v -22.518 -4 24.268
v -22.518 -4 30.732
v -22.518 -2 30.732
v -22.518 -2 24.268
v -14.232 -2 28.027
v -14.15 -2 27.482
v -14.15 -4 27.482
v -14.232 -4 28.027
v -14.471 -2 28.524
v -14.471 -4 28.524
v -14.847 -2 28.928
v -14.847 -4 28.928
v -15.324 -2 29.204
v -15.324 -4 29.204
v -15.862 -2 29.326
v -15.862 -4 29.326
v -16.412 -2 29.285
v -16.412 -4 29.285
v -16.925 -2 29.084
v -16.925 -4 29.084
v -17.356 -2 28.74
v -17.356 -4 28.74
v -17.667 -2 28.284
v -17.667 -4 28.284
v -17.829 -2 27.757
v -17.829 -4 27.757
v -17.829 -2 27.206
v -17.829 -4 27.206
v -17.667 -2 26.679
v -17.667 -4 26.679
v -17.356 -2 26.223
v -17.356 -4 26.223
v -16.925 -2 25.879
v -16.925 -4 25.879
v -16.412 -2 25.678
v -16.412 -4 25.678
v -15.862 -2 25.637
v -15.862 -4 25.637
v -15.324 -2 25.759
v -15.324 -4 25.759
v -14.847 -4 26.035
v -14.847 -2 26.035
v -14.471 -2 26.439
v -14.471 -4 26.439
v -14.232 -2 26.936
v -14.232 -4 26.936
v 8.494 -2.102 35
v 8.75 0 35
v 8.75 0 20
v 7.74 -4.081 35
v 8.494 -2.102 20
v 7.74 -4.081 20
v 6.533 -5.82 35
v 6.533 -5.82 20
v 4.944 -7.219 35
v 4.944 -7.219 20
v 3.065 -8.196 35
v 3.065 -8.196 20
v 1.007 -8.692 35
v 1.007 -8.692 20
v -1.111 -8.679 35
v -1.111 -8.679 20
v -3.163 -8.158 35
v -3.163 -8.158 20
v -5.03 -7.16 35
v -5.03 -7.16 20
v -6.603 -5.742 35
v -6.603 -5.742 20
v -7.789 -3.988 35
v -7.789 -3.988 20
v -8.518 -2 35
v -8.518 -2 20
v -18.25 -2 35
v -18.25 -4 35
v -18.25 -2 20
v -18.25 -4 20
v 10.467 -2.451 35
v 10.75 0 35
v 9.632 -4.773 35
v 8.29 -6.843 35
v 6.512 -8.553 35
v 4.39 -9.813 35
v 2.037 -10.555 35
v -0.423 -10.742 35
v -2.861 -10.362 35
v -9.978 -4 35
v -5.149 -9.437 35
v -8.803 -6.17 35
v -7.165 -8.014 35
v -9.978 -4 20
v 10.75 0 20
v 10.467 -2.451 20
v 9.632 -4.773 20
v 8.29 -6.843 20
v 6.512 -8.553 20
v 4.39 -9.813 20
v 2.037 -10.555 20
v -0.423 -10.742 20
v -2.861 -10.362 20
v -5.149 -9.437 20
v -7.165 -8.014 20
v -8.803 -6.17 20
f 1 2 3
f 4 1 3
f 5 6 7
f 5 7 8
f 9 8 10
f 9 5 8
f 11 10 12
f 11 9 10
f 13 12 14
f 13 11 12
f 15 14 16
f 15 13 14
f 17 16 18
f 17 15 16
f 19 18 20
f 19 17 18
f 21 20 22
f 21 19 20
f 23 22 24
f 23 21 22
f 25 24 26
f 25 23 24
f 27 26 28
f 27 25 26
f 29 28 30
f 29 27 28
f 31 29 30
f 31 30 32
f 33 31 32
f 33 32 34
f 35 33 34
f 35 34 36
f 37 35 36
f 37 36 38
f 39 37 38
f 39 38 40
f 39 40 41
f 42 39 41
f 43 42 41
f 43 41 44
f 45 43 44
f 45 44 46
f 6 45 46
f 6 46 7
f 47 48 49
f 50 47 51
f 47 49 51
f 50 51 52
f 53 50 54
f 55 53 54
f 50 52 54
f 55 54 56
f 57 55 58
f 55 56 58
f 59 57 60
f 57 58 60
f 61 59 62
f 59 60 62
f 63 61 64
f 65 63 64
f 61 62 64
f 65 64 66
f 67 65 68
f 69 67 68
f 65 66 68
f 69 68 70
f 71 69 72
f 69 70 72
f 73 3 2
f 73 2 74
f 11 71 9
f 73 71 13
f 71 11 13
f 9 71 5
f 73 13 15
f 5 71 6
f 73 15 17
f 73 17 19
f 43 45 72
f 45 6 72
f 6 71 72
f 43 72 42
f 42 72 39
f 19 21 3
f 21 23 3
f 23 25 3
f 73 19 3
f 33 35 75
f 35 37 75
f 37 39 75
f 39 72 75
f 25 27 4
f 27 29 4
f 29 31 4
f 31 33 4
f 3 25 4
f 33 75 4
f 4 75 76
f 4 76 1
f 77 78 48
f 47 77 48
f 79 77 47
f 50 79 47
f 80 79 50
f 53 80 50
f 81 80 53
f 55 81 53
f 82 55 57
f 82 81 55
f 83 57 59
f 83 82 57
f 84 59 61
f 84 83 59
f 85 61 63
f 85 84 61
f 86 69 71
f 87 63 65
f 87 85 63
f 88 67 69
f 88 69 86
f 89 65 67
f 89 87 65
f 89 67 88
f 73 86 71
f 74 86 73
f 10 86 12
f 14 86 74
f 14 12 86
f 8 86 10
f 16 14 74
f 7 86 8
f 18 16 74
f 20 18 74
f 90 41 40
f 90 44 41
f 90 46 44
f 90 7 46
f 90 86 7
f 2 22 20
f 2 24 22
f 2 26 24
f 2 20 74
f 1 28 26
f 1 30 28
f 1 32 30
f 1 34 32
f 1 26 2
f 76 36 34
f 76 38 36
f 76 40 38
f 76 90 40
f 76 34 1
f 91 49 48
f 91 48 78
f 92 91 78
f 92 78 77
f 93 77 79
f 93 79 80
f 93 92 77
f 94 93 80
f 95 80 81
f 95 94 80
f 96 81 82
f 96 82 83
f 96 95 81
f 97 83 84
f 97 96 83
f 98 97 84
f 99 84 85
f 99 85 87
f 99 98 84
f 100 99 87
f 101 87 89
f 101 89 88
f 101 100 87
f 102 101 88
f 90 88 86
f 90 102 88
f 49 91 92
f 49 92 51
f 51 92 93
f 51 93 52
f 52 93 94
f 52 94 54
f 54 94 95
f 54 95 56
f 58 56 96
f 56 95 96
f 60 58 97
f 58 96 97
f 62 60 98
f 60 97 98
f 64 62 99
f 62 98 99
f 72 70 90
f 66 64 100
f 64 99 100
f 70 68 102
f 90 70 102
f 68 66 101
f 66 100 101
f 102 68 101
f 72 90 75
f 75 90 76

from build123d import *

# Parameters (mm, degrees)
SKETCH016_R       = 1.85
EXTRUDE013_DEPTH  = 12
CYLINDER007_R     = 5
CYLINDER007_DEPTH = 1
EXTRUDE012_DEPTH  = 15


with BuildPart() as extrude013:
    # Sketch016 → Extrude013 (new body)
    with BuildSketch(Plane.XZ):
        Polygon((11.75, 36), (11.75, 19), (-17.25, 19), (-23.25, 25), (-23.25, 30), (-17.25, 36), align=None)
        with Locations((-16, 27.481564)):
            Circle(SKETCH016_R, mode=Mode.SUBTRACT)
    extrude(amount=-EXTRUDE013_DEPTH)


with BuildPart() as unprintable:
    # Cylinder007 → Cylinder007 (new body)
    with BuildSketch(Plane(origin=(-16, 18, 27.5), x_dir=(1, 0, 0), z_dir=(0, -1, 0))):
        Circle(CYLINDER007_R)
    extrude(amount=CYLINDER007_DEPTH)


with BuildPart() as body007:
    # Sketch015 → Extrude012 (new body)
    with BuildSketch(Plane.XY.offset(50)):
        with BuildLine():
            ThreePointArc((8.75, 0), (1.006685, 8.691898), (-8.518363, 2))
            Line((-8.518363, 2), (-22.518363, 2))
            Line((-22.518363, 4), (-22.518363, 2))
            Line((-9.978101, 4), (-22.518363, 4))
            ThreePointArc((10.75, 0), (2.036899, 10.555261), (-9.978101, 4))
            Line((8.75, 0), (10.75, 0))
        make_face()
    extrude(amount=EXTRUDE012_DEPTH)


with BuildPart() as body007_1:
    # Extrude012 placement: moved
    add(body007.part.moved(Location((0, 0, -30))))

    # Fusion016: union unprintable
    add(unprintable.part)

    # Common001: intersect Extrude013
    add(extrude013.part, mode=Mode.INTERSECT)


with BuildPart() as part_mirroring008:
    # Part__Mirroring008: instance of Body007
    add(body007_1.part.mirror(Plane(origin=(0, 0, 0), x_dir=(1, 0, 0), z_dir=(0, 1, 0))))


solid = part_mirroring008.part
